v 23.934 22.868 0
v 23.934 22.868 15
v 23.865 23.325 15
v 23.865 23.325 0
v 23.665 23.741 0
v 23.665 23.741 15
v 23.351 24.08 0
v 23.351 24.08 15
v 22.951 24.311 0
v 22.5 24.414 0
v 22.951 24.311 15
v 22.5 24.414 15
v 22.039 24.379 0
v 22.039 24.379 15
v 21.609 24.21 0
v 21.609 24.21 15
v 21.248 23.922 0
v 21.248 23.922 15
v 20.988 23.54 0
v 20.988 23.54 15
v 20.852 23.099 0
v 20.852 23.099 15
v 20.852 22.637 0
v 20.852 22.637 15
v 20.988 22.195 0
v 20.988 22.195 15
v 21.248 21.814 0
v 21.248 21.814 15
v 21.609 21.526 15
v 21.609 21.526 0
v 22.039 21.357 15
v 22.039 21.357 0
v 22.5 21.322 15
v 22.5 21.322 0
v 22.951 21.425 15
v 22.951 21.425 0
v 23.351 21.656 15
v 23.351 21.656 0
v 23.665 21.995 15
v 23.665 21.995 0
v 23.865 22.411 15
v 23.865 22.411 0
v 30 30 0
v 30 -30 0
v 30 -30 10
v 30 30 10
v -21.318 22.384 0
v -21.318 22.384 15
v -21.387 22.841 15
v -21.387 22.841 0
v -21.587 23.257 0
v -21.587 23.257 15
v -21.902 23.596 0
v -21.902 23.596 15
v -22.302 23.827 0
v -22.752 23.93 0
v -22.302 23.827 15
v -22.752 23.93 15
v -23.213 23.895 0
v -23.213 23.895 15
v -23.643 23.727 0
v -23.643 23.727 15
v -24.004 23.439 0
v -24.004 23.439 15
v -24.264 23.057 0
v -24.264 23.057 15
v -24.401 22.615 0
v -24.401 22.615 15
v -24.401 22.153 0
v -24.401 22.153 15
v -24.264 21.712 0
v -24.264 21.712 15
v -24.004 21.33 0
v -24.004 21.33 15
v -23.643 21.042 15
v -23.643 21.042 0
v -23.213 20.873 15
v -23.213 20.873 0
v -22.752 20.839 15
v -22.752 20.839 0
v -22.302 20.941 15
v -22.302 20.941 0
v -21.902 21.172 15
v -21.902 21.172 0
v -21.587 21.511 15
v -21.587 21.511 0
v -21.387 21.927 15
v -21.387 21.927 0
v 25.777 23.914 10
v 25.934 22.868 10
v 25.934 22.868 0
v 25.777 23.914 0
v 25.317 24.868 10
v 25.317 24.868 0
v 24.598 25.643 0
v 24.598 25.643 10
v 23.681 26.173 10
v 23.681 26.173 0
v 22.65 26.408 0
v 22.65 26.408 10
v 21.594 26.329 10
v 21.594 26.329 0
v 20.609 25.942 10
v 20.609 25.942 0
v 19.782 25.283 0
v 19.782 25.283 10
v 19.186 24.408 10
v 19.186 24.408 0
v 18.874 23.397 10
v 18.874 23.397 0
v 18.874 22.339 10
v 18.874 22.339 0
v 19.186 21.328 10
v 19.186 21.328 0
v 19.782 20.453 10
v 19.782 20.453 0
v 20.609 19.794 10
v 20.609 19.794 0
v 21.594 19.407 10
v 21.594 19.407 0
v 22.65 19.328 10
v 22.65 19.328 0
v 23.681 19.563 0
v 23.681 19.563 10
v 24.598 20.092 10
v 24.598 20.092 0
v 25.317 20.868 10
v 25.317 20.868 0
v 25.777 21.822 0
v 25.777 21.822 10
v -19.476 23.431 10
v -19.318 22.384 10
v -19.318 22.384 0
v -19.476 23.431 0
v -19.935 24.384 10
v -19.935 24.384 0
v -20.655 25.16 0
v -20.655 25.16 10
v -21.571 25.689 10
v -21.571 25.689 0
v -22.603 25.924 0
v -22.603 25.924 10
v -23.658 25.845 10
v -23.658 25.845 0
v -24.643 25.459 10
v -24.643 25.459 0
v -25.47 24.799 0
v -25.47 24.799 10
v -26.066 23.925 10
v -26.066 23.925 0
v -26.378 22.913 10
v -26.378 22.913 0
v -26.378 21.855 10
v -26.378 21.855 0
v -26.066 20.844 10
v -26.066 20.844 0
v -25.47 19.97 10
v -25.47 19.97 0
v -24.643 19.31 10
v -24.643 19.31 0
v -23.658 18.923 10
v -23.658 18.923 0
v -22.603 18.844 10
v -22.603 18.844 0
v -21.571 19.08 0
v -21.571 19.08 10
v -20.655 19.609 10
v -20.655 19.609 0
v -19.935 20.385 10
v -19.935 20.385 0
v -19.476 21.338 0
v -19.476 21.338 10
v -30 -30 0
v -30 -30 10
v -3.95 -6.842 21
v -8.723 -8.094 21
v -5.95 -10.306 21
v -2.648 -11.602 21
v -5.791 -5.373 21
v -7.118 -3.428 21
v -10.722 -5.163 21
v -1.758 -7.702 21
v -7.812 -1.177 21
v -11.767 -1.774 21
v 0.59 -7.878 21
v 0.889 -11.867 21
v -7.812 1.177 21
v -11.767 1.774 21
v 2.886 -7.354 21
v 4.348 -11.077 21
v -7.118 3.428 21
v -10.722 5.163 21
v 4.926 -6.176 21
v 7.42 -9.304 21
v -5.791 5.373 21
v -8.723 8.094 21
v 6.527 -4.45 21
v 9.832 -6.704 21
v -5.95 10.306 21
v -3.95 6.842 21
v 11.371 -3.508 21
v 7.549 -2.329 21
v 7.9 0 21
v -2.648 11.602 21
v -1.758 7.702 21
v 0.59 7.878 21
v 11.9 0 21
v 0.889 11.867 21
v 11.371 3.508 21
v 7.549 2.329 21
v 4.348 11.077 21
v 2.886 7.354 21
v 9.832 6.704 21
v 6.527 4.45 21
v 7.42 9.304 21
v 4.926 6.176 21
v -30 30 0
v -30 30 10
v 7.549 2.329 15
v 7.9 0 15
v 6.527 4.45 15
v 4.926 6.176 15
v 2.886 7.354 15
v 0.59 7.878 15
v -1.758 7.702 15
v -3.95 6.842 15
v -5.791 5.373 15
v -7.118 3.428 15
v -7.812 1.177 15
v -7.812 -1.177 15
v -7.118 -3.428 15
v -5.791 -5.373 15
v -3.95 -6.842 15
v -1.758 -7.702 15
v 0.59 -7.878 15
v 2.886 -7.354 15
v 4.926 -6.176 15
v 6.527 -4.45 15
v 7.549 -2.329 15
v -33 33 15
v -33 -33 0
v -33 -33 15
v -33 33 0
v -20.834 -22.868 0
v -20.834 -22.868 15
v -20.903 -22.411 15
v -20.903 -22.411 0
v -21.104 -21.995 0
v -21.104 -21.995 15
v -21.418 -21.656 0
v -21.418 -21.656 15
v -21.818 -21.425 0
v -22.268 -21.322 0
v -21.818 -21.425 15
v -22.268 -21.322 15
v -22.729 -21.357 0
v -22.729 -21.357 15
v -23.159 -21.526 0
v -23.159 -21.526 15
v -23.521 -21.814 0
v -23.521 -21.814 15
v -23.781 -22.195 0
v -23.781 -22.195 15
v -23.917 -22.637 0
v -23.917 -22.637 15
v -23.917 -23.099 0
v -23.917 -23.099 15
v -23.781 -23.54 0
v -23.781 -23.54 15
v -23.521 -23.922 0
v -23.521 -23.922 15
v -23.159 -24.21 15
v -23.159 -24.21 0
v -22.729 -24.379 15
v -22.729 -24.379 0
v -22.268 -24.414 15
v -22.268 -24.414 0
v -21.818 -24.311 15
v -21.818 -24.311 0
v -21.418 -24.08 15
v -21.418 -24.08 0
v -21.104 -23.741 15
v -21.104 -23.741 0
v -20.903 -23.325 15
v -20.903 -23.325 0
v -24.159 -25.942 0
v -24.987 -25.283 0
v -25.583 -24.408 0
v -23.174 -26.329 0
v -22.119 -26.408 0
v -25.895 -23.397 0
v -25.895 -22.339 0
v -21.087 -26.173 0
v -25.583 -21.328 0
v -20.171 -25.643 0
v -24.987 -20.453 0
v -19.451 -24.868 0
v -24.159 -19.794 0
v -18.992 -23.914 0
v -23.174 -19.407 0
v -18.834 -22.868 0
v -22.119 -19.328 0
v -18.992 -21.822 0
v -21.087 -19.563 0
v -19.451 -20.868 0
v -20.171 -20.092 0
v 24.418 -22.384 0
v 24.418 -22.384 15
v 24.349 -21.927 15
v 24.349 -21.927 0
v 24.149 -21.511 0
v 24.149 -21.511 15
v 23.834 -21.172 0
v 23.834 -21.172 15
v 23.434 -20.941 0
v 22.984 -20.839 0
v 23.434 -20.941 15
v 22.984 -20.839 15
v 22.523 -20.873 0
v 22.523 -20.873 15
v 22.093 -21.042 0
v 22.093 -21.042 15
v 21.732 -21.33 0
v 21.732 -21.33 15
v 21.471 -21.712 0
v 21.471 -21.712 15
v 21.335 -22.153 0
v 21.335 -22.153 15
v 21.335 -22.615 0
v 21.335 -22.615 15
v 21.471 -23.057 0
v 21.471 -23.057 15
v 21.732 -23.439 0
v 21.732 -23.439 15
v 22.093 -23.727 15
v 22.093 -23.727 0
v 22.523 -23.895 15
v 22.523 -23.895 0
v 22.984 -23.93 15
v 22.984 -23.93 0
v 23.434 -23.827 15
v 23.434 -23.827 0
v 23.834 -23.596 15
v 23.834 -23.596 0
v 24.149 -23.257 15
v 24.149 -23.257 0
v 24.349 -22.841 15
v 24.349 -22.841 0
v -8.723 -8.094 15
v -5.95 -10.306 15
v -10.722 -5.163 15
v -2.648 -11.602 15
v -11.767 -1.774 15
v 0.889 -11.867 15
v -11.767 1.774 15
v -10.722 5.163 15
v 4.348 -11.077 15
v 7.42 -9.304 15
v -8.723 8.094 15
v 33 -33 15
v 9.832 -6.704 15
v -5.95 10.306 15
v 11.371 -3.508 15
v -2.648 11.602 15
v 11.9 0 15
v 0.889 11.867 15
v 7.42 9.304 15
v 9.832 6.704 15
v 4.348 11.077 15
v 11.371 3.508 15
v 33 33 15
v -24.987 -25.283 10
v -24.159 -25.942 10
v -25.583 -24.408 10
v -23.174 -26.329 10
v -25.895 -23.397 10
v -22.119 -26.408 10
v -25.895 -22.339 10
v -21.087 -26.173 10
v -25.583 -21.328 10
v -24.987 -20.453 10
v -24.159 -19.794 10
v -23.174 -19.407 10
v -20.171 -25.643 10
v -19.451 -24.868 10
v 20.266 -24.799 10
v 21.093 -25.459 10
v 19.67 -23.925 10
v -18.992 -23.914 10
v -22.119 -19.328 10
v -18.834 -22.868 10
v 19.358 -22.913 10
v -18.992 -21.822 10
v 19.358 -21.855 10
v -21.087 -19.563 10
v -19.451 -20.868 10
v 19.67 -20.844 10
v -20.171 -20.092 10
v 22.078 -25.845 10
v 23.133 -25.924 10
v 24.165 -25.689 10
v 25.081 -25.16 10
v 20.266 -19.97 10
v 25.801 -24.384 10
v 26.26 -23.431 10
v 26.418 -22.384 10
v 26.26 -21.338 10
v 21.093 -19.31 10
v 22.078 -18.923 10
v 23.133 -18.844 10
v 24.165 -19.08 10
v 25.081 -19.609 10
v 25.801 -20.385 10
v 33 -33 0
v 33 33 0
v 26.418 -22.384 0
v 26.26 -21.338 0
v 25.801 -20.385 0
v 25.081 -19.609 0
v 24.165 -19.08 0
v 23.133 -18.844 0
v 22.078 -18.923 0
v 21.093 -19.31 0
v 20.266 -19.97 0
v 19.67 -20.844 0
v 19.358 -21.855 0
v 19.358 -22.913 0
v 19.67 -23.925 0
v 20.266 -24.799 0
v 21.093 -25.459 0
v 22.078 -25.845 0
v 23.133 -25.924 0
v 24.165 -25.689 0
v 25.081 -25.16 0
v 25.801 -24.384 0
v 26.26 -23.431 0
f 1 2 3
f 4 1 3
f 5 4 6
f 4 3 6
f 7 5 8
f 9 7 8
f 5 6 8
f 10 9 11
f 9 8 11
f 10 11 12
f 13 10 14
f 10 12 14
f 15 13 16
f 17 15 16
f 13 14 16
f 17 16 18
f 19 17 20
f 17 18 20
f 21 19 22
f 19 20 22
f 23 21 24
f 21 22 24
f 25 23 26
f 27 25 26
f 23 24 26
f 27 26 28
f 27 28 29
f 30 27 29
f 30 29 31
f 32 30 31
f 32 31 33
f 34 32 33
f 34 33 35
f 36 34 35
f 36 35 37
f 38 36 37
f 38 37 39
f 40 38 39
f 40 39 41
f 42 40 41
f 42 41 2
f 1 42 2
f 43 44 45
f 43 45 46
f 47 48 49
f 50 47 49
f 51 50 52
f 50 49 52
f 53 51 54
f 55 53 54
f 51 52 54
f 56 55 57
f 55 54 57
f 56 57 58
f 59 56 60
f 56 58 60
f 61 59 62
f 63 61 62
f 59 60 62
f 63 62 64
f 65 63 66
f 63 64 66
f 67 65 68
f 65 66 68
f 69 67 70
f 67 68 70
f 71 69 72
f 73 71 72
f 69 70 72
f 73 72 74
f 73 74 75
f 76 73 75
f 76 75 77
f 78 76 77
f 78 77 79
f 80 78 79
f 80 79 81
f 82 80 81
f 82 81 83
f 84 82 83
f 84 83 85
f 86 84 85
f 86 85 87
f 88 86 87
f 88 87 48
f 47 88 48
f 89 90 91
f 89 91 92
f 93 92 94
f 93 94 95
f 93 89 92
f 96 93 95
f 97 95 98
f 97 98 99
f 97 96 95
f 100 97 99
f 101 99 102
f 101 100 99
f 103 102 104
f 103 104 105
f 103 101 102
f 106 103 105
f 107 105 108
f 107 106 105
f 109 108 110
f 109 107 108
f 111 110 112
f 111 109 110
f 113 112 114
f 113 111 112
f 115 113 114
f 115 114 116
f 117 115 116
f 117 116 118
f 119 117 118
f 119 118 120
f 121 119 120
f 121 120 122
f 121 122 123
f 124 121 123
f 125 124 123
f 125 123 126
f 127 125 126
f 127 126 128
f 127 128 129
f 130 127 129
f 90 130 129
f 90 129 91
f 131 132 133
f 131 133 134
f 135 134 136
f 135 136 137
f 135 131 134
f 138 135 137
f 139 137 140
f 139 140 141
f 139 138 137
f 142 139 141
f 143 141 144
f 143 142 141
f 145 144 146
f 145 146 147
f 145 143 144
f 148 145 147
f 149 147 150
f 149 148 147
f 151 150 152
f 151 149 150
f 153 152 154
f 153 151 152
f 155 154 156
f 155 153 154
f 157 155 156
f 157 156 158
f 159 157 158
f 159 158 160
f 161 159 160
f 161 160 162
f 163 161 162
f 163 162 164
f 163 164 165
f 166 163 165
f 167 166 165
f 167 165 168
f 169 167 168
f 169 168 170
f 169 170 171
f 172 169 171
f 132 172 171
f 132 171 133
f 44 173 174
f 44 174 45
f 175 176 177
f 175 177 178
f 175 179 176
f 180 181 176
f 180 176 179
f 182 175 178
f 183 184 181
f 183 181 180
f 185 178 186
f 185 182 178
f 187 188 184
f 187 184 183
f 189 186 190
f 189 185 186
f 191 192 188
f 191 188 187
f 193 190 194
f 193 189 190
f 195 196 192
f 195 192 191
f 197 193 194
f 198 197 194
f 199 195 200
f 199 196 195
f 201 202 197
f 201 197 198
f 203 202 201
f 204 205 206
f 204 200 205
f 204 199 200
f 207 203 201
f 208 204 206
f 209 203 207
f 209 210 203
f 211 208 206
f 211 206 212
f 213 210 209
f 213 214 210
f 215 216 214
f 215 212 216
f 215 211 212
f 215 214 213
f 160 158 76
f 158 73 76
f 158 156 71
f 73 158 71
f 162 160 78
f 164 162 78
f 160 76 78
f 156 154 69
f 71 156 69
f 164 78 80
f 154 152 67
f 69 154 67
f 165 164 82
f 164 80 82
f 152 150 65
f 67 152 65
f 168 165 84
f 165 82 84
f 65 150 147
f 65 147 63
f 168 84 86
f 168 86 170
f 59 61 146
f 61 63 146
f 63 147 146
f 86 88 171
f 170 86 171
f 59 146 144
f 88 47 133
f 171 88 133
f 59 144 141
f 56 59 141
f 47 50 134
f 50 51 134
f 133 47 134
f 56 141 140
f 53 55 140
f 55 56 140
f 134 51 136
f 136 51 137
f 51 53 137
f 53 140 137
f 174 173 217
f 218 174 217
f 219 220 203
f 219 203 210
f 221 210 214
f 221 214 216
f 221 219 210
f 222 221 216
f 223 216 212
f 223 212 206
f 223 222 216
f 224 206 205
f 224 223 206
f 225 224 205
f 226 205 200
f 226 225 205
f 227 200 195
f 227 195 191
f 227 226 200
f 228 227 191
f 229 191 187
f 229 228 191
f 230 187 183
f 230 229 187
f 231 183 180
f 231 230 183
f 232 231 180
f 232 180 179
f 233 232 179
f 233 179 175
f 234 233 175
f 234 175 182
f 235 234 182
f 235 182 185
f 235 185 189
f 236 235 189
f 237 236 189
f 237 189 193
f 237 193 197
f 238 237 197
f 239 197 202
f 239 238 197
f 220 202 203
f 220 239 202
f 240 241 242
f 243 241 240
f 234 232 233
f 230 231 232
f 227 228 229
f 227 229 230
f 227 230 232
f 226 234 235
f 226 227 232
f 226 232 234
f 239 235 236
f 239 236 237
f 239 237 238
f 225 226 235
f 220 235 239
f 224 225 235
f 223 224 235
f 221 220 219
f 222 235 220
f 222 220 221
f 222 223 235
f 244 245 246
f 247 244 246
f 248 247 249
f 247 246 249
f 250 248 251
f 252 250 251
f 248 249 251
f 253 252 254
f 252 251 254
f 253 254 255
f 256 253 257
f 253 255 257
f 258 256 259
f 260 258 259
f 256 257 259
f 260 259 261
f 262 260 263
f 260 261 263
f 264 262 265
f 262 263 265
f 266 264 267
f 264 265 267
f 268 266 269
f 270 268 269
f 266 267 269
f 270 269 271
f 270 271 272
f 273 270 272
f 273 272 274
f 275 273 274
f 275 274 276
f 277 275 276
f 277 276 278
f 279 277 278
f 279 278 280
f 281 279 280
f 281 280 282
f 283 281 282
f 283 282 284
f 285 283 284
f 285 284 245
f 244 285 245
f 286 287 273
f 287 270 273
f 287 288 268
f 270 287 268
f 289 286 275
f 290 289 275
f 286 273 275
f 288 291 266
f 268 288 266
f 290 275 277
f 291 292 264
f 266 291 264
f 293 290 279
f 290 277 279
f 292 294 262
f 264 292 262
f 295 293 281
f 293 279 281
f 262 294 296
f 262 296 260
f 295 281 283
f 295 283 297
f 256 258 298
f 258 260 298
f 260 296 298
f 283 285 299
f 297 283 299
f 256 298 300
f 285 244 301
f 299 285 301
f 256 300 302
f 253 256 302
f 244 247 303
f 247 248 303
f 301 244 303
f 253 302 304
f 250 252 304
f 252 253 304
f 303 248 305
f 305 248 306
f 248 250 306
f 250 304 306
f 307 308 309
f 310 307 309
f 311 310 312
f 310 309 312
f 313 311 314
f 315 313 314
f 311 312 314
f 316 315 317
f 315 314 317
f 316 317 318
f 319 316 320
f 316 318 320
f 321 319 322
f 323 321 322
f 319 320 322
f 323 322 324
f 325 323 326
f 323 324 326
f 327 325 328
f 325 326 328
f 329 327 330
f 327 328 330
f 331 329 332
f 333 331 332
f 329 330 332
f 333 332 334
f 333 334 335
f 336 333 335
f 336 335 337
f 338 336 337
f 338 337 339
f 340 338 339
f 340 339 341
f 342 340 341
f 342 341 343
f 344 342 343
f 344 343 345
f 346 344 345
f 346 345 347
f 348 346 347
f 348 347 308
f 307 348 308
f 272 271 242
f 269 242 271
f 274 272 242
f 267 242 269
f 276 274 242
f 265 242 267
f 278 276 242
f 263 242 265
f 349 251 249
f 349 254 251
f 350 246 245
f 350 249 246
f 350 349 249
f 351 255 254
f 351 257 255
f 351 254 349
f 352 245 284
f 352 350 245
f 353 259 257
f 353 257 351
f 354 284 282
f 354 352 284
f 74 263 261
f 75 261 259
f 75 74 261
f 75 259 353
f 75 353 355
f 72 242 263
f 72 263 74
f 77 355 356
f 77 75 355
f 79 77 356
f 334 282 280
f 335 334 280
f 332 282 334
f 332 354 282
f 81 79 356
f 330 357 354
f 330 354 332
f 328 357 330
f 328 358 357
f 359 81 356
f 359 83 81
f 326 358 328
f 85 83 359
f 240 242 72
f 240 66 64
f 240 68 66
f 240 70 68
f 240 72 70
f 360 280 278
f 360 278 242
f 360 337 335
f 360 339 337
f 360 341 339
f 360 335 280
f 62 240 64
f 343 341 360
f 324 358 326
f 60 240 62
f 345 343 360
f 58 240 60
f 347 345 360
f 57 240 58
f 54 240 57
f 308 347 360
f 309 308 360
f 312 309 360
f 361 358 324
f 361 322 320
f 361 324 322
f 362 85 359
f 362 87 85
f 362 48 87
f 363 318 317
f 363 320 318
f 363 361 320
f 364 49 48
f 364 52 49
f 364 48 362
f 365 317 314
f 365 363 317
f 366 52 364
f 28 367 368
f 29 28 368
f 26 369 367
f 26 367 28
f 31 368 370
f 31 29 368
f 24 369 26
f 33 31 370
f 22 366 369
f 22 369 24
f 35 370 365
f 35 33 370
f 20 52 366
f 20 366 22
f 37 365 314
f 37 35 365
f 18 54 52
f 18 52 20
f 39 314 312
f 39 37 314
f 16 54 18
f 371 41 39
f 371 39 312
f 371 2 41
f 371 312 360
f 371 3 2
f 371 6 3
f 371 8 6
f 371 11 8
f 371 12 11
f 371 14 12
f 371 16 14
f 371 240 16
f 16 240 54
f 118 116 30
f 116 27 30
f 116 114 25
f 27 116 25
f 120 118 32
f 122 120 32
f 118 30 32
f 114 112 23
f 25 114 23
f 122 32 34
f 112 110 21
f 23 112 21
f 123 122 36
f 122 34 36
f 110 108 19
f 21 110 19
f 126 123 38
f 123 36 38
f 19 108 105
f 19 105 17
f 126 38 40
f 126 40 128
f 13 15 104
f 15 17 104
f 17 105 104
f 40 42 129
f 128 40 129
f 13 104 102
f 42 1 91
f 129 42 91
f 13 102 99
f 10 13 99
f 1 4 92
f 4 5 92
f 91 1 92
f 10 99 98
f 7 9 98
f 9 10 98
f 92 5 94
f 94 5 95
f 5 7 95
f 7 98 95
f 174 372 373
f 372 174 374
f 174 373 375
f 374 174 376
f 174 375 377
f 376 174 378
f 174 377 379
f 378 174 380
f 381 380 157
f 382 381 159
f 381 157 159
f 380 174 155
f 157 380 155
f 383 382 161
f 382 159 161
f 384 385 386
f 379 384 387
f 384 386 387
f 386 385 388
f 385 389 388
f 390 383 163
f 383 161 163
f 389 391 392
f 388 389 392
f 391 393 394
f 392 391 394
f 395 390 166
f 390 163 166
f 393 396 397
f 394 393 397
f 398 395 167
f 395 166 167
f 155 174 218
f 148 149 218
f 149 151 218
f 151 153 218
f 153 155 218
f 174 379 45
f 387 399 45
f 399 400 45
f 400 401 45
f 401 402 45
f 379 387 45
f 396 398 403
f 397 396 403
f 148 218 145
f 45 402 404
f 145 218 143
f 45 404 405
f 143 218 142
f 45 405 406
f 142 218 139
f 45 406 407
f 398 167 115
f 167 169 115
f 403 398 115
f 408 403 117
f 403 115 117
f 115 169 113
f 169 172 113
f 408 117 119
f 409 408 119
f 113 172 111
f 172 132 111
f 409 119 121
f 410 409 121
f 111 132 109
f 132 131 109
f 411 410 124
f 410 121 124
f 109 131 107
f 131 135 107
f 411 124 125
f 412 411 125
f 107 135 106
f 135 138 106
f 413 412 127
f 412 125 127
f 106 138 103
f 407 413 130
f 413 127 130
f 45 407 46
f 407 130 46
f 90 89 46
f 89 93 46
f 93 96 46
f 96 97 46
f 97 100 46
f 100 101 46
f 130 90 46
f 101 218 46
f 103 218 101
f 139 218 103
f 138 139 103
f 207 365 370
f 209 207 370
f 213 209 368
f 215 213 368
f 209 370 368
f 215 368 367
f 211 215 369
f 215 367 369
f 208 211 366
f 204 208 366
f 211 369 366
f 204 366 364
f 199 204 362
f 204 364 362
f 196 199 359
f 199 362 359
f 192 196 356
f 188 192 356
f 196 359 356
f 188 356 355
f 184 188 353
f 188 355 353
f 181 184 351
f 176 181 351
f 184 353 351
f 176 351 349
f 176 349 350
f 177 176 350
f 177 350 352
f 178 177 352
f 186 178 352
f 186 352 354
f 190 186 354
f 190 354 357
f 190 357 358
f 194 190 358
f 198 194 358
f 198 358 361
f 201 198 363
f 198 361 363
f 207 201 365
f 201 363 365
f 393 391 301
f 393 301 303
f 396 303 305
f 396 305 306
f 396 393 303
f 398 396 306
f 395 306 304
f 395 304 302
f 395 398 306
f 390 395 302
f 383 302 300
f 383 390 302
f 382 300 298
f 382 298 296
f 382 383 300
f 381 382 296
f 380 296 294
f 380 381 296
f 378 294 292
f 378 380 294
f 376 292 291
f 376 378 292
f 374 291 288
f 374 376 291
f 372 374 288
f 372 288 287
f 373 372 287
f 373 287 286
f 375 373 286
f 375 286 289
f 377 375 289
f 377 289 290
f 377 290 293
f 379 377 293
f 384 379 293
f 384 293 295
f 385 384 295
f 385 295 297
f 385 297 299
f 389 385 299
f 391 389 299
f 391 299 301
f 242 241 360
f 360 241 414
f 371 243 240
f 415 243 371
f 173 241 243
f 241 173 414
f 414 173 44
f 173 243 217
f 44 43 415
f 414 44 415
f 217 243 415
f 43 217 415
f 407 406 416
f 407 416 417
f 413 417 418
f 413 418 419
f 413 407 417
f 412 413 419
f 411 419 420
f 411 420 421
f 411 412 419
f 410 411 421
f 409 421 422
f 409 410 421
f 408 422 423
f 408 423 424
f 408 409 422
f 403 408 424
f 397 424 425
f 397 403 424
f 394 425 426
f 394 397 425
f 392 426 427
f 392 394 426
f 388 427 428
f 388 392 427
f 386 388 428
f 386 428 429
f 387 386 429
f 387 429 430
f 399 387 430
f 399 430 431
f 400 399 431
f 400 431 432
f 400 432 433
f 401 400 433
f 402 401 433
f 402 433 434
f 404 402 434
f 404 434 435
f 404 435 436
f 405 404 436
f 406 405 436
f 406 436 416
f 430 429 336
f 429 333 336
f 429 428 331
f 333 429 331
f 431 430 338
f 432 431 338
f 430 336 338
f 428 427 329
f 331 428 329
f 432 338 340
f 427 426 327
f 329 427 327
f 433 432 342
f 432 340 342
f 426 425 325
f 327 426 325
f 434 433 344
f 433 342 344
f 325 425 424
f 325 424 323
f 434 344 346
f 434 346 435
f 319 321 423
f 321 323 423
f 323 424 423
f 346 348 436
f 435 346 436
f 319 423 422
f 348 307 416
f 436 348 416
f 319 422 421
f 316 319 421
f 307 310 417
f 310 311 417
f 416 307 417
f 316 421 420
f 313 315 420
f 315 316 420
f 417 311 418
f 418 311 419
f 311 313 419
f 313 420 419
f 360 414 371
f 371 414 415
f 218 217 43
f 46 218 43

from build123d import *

# Parameters (mm, degrees)
SKETCH1_W           = 66
SKETCH1_H           = 66
SKETCH1_W_2         = 60
SKETCH1_H_2         = 60
EXTRUDE_THIN1_DEPTH = 15
BOSS_EXTRUDE1_START = 15
SKETCH1_2_W         = 60
SKETCH1_2_H         = 60
BOSS_EXTRUDE1_DEPTH = 5
SKETCH2_R           = 1.55
CUT_EXTRUDE1_DEPTH  = 50.020403915
SKETCH2_2_R         = 3.55
SKETCH2_2_R_2       = 1.55
EXTRUDE_THIN2_DEPTH = 15
SKETCH3_R           = 11.9
SKETCH3_R_2         = 7.9
BOSS_EXTRUDE2_DEPTH = 6


with BuildPart() as part:
    # Sketch1 → Extrude-Thin1 (new body)
    with BuildSketch(Plane.XY):
        Rectangle(SKETCH1_W, SKETCH1_H)
        Rectangle(SKETCH1_W_2, SKETCH1_H_2, mode=Mode.SUBTRACT)
    extrude(amount=EXTRUDE_THIN1_DEPTH)

    # Sketch1<2> → Boss-Extrude1 (add)
    with BuildSketch(Plane.XY.offset(BOSS_EXTRUDE1_START)):
        Rectangle(SKETCH1_2_W, SKETCH1_2_H)
    extrude(amount=-BOSS_EXTRUDE1_DEPTH)

    # Sketch2 → Cut-Extrude1 (cut, through all)
    with BuildSketch(Plane.XY.offset(15)):
        with Locations((22.384300197, 22.867949289)):
            Circle(SKETCH2_R)
        with Locations((22.867949289, -22.384300197)):
            Circle(SKETCH2_R)
        with Locations((-22.384300197, -22.867949289)):
            Circle(SKETCH2_R)
        with Locations((-22.867949289, 22.384300197)):
            Circle(SKETCH2_R)
    extrude(amount=-CUT_EXTRUDE1_DEPTH, mode=Mode.SUBTRACT)

    # Sketch2<2> → Extrude-Thin2 (add)
    # profile 1 of 4: a face of its own
    with BuildSketch(Plane.XY.offset(15)):
        with Locations((22.384300197, 22.867949289)):
            Circle(SKETCH2_2_R)
        with Locations((22.384300197, 22.867949289)):
            Circle(SKETCH2_2_R_2, mode=Mode.SUBTRACT)
    # profile 2 of 4: a face of its own
    with BuildSketch(Plane.XY.offset(15)):
        with Locations((22.867949289, -22.384300197)):
            Circle(SKETCH2_2_R)
        with Locations((22.867949289, -22.384300197)):
            Circle(SKETCH2_2_R_2, mode=Mode.SUBTRACT)
    # profile 3 of 4: a face of its own
    with BuildSketch(Plane.XY.offset(15)):
        with Locations((-22.384300197, -22.867949289)):
            Circle(SKETCH2_2_R)
        with Locations((-22.384300197, -22.867949289)):
            Circle(SKETCH2_2_R_2, mode=Mode.SUBTRACT)
    # profile 4 of 4: a face of its own
    with BuildSketch(Plane.XY.offset(15)):
        with Locations((-22.867949289, 22.384300197)):
            Circle(SKETCH2_2_R)
        with Locations((-22.867949289, 22.384300197)):
            Circle(SKETCH2_2_R_2, mode=Mode.SUBTRACT)
    extrude(amount=-EXTRUDE_THIN2_DEPTH)

    # Sketch3 → Boss-Extrude2 (add)
    with BuildSketch(Plane.XY.offset(15)):
        Circle(SKETCH3_R)
        Circle(SKETCH3_R_2, mode=Mode.SUBTRACT)
    extrude(amount=BOSS_EXTRUDE2_DEPTH)


solid = part.part
